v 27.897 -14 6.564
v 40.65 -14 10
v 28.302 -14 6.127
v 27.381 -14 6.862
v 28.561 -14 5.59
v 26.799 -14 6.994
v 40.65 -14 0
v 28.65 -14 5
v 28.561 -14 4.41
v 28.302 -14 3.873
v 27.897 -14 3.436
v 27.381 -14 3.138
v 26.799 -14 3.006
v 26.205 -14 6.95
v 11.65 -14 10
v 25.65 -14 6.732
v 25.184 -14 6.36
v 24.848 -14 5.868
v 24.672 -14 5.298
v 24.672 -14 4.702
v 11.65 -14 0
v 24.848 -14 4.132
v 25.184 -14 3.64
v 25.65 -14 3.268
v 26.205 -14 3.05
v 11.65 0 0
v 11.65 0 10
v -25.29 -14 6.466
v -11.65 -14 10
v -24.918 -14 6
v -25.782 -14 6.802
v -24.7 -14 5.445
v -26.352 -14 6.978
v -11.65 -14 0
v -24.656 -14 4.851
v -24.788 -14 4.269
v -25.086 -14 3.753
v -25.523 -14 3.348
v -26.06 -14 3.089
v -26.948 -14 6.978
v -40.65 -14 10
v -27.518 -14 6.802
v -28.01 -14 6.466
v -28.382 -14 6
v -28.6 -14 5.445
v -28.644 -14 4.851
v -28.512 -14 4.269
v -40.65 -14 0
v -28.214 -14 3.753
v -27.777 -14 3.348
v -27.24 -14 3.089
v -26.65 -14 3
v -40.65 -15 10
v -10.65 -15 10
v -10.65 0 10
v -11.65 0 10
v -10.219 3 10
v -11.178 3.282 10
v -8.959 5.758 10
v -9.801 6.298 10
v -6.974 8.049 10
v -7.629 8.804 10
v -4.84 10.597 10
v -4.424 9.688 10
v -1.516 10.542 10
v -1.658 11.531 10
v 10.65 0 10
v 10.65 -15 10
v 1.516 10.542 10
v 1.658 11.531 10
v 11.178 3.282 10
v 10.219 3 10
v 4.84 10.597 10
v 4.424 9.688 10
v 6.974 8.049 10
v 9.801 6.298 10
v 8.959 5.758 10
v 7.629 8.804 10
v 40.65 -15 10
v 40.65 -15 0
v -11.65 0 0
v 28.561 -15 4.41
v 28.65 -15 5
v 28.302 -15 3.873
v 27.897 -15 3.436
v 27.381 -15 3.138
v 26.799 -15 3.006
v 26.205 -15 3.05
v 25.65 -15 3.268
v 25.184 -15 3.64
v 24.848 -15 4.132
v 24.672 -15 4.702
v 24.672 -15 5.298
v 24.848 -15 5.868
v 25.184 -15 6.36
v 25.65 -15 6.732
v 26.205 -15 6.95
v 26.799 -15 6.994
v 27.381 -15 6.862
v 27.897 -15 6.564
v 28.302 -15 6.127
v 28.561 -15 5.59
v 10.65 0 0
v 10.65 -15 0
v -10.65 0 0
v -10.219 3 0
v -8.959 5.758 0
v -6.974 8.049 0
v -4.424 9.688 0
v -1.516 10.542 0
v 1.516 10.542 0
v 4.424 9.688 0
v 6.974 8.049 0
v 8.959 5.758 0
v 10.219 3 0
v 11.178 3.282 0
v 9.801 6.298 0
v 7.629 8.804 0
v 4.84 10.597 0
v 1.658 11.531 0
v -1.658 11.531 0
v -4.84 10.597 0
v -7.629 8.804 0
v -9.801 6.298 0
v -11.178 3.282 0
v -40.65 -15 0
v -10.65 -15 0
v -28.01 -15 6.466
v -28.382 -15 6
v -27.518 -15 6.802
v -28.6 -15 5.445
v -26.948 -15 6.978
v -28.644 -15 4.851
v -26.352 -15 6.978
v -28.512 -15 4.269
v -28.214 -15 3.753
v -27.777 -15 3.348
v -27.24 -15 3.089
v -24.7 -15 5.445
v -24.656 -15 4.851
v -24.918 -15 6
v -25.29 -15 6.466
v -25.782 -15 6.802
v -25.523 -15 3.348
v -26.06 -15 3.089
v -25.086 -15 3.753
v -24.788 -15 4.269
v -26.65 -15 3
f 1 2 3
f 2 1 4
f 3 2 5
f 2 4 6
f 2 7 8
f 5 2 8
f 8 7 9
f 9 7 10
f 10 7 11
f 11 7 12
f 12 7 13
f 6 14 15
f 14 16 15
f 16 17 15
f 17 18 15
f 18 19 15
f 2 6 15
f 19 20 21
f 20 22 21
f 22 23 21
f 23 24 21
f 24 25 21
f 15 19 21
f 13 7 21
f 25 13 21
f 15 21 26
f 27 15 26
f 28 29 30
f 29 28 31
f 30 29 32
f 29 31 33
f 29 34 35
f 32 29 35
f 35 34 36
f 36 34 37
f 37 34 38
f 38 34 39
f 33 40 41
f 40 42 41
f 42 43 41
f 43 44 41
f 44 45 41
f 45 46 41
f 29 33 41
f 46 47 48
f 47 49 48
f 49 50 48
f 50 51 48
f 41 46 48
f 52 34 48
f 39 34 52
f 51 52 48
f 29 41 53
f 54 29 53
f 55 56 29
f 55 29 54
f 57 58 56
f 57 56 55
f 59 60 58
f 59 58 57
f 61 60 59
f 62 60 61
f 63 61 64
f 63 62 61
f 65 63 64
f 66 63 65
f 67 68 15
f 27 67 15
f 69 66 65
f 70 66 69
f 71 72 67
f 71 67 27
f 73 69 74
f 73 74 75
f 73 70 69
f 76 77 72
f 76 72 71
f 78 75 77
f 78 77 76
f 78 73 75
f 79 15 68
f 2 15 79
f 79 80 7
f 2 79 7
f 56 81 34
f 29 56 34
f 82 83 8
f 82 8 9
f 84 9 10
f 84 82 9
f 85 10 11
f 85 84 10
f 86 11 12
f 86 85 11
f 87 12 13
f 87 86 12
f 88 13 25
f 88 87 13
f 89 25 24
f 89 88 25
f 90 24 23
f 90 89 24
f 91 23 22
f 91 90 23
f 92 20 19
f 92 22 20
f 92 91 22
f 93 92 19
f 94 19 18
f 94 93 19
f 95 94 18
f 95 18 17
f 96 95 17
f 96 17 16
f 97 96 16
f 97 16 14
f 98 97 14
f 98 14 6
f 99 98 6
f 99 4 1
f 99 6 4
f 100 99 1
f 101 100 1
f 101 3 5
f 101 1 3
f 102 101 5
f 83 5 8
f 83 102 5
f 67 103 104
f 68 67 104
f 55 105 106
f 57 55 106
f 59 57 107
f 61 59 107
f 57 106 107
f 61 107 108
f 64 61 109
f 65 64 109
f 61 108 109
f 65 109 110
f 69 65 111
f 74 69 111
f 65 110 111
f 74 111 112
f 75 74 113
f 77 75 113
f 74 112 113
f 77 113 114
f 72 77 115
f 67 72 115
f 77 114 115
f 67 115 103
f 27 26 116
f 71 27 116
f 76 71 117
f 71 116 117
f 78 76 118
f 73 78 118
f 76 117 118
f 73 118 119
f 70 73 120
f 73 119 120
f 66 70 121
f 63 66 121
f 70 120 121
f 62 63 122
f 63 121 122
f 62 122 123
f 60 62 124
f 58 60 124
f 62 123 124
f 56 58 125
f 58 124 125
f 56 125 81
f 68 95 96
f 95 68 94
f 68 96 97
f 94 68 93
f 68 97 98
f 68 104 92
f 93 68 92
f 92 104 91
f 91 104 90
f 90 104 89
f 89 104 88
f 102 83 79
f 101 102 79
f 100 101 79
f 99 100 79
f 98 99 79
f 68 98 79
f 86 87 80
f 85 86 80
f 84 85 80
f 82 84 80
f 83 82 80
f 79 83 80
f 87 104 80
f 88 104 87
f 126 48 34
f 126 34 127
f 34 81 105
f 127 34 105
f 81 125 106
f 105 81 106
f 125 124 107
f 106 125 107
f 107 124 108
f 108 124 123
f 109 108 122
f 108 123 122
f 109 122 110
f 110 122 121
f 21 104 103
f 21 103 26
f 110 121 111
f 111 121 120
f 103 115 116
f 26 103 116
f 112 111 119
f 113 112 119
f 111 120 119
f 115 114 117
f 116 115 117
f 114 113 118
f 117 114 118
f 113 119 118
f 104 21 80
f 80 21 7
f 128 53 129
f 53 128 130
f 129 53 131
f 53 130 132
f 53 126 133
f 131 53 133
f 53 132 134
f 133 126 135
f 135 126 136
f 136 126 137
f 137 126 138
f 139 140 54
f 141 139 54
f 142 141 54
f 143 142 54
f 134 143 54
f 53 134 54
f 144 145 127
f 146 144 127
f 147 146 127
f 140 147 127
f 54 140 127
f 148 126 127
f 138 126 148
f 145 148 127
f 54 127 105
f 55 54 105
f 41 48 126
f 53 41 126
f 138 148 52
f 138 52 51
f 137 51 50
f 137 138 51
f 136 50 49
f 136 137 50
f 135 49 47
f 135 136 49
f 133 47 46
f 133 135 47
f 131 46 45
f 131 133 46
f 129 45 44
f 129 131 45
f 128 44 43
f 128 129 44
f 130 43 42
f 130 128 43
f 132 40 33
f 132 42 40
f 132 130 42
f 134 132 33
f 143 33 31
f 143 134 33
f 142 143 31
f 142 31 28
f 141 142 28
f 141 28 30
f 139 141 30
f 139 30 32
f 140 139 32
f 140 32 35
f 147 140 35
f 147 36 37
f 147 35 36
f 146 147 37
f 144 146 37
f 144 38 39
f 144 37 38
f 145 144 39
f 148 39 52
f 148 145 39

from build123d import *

# Parameters (mm, degrees)
SALIENTE_EXTRUIR1_DEPTH = 10
CROQUIS2_R              = 2
CORTAR_EXTRUIR1_DEPTH   = 10


with BuildPart() as part:
    # Croquis1 → Saliente-Extruir1 (new body)
    with BuildSketch(Plane.XY):
        with BuildLine():
            Line((10.65, 0), (10.65, -15))
            Line((10.65, -15), (40.65, -15))
            Line((40.65, -15), (40.65, -14))
            Line((40.65, -14), (39.65, -14))
            Line((39.65, -14), (11.65, -14))
            Line((11.65, -14), (11.65, 0))
            ThreePointArc((11.65, 0), (0, 11.65), (-11.65, 0))
            Line((-11.65, 0), (-11.65, -14))
            Line((-11.65, -14), (-39.65, -14))
            Line((-39.65, -14), (-40.65, -14))
            Line((-40.65, -14), (-40.65, -15))
            Line((-40.65, -15), (-10.65, -15))
            Line((-10.65, -15), (-10.65, 0))
            ThreePointArc((-10.65, 0), (0, 10.65), (10.65, 0))
        make_face()
    extrude(amount=SALIENTE_EXTRUIR1_DEPTH)

    # Croquis2 → Cortar-Extruir1 (cut)
    with BuildSketch(Plane(origin=(0, -16.507351352, 0), x_dir=(1, 0, 0), z_dir=(0, 1, 0))):
        with Locations(Location((-26.65, -5, 0), (0, 0, 90))):
            Circle(CROQUIS2_R)
        with Locations((26.65, -5)):
            Circle(CROQUIS2_R)
    extrude(amount=CORTAR_EXTRUIR1_DEPTH, mode=Mode.SUBTRACT)


solid = part.part
